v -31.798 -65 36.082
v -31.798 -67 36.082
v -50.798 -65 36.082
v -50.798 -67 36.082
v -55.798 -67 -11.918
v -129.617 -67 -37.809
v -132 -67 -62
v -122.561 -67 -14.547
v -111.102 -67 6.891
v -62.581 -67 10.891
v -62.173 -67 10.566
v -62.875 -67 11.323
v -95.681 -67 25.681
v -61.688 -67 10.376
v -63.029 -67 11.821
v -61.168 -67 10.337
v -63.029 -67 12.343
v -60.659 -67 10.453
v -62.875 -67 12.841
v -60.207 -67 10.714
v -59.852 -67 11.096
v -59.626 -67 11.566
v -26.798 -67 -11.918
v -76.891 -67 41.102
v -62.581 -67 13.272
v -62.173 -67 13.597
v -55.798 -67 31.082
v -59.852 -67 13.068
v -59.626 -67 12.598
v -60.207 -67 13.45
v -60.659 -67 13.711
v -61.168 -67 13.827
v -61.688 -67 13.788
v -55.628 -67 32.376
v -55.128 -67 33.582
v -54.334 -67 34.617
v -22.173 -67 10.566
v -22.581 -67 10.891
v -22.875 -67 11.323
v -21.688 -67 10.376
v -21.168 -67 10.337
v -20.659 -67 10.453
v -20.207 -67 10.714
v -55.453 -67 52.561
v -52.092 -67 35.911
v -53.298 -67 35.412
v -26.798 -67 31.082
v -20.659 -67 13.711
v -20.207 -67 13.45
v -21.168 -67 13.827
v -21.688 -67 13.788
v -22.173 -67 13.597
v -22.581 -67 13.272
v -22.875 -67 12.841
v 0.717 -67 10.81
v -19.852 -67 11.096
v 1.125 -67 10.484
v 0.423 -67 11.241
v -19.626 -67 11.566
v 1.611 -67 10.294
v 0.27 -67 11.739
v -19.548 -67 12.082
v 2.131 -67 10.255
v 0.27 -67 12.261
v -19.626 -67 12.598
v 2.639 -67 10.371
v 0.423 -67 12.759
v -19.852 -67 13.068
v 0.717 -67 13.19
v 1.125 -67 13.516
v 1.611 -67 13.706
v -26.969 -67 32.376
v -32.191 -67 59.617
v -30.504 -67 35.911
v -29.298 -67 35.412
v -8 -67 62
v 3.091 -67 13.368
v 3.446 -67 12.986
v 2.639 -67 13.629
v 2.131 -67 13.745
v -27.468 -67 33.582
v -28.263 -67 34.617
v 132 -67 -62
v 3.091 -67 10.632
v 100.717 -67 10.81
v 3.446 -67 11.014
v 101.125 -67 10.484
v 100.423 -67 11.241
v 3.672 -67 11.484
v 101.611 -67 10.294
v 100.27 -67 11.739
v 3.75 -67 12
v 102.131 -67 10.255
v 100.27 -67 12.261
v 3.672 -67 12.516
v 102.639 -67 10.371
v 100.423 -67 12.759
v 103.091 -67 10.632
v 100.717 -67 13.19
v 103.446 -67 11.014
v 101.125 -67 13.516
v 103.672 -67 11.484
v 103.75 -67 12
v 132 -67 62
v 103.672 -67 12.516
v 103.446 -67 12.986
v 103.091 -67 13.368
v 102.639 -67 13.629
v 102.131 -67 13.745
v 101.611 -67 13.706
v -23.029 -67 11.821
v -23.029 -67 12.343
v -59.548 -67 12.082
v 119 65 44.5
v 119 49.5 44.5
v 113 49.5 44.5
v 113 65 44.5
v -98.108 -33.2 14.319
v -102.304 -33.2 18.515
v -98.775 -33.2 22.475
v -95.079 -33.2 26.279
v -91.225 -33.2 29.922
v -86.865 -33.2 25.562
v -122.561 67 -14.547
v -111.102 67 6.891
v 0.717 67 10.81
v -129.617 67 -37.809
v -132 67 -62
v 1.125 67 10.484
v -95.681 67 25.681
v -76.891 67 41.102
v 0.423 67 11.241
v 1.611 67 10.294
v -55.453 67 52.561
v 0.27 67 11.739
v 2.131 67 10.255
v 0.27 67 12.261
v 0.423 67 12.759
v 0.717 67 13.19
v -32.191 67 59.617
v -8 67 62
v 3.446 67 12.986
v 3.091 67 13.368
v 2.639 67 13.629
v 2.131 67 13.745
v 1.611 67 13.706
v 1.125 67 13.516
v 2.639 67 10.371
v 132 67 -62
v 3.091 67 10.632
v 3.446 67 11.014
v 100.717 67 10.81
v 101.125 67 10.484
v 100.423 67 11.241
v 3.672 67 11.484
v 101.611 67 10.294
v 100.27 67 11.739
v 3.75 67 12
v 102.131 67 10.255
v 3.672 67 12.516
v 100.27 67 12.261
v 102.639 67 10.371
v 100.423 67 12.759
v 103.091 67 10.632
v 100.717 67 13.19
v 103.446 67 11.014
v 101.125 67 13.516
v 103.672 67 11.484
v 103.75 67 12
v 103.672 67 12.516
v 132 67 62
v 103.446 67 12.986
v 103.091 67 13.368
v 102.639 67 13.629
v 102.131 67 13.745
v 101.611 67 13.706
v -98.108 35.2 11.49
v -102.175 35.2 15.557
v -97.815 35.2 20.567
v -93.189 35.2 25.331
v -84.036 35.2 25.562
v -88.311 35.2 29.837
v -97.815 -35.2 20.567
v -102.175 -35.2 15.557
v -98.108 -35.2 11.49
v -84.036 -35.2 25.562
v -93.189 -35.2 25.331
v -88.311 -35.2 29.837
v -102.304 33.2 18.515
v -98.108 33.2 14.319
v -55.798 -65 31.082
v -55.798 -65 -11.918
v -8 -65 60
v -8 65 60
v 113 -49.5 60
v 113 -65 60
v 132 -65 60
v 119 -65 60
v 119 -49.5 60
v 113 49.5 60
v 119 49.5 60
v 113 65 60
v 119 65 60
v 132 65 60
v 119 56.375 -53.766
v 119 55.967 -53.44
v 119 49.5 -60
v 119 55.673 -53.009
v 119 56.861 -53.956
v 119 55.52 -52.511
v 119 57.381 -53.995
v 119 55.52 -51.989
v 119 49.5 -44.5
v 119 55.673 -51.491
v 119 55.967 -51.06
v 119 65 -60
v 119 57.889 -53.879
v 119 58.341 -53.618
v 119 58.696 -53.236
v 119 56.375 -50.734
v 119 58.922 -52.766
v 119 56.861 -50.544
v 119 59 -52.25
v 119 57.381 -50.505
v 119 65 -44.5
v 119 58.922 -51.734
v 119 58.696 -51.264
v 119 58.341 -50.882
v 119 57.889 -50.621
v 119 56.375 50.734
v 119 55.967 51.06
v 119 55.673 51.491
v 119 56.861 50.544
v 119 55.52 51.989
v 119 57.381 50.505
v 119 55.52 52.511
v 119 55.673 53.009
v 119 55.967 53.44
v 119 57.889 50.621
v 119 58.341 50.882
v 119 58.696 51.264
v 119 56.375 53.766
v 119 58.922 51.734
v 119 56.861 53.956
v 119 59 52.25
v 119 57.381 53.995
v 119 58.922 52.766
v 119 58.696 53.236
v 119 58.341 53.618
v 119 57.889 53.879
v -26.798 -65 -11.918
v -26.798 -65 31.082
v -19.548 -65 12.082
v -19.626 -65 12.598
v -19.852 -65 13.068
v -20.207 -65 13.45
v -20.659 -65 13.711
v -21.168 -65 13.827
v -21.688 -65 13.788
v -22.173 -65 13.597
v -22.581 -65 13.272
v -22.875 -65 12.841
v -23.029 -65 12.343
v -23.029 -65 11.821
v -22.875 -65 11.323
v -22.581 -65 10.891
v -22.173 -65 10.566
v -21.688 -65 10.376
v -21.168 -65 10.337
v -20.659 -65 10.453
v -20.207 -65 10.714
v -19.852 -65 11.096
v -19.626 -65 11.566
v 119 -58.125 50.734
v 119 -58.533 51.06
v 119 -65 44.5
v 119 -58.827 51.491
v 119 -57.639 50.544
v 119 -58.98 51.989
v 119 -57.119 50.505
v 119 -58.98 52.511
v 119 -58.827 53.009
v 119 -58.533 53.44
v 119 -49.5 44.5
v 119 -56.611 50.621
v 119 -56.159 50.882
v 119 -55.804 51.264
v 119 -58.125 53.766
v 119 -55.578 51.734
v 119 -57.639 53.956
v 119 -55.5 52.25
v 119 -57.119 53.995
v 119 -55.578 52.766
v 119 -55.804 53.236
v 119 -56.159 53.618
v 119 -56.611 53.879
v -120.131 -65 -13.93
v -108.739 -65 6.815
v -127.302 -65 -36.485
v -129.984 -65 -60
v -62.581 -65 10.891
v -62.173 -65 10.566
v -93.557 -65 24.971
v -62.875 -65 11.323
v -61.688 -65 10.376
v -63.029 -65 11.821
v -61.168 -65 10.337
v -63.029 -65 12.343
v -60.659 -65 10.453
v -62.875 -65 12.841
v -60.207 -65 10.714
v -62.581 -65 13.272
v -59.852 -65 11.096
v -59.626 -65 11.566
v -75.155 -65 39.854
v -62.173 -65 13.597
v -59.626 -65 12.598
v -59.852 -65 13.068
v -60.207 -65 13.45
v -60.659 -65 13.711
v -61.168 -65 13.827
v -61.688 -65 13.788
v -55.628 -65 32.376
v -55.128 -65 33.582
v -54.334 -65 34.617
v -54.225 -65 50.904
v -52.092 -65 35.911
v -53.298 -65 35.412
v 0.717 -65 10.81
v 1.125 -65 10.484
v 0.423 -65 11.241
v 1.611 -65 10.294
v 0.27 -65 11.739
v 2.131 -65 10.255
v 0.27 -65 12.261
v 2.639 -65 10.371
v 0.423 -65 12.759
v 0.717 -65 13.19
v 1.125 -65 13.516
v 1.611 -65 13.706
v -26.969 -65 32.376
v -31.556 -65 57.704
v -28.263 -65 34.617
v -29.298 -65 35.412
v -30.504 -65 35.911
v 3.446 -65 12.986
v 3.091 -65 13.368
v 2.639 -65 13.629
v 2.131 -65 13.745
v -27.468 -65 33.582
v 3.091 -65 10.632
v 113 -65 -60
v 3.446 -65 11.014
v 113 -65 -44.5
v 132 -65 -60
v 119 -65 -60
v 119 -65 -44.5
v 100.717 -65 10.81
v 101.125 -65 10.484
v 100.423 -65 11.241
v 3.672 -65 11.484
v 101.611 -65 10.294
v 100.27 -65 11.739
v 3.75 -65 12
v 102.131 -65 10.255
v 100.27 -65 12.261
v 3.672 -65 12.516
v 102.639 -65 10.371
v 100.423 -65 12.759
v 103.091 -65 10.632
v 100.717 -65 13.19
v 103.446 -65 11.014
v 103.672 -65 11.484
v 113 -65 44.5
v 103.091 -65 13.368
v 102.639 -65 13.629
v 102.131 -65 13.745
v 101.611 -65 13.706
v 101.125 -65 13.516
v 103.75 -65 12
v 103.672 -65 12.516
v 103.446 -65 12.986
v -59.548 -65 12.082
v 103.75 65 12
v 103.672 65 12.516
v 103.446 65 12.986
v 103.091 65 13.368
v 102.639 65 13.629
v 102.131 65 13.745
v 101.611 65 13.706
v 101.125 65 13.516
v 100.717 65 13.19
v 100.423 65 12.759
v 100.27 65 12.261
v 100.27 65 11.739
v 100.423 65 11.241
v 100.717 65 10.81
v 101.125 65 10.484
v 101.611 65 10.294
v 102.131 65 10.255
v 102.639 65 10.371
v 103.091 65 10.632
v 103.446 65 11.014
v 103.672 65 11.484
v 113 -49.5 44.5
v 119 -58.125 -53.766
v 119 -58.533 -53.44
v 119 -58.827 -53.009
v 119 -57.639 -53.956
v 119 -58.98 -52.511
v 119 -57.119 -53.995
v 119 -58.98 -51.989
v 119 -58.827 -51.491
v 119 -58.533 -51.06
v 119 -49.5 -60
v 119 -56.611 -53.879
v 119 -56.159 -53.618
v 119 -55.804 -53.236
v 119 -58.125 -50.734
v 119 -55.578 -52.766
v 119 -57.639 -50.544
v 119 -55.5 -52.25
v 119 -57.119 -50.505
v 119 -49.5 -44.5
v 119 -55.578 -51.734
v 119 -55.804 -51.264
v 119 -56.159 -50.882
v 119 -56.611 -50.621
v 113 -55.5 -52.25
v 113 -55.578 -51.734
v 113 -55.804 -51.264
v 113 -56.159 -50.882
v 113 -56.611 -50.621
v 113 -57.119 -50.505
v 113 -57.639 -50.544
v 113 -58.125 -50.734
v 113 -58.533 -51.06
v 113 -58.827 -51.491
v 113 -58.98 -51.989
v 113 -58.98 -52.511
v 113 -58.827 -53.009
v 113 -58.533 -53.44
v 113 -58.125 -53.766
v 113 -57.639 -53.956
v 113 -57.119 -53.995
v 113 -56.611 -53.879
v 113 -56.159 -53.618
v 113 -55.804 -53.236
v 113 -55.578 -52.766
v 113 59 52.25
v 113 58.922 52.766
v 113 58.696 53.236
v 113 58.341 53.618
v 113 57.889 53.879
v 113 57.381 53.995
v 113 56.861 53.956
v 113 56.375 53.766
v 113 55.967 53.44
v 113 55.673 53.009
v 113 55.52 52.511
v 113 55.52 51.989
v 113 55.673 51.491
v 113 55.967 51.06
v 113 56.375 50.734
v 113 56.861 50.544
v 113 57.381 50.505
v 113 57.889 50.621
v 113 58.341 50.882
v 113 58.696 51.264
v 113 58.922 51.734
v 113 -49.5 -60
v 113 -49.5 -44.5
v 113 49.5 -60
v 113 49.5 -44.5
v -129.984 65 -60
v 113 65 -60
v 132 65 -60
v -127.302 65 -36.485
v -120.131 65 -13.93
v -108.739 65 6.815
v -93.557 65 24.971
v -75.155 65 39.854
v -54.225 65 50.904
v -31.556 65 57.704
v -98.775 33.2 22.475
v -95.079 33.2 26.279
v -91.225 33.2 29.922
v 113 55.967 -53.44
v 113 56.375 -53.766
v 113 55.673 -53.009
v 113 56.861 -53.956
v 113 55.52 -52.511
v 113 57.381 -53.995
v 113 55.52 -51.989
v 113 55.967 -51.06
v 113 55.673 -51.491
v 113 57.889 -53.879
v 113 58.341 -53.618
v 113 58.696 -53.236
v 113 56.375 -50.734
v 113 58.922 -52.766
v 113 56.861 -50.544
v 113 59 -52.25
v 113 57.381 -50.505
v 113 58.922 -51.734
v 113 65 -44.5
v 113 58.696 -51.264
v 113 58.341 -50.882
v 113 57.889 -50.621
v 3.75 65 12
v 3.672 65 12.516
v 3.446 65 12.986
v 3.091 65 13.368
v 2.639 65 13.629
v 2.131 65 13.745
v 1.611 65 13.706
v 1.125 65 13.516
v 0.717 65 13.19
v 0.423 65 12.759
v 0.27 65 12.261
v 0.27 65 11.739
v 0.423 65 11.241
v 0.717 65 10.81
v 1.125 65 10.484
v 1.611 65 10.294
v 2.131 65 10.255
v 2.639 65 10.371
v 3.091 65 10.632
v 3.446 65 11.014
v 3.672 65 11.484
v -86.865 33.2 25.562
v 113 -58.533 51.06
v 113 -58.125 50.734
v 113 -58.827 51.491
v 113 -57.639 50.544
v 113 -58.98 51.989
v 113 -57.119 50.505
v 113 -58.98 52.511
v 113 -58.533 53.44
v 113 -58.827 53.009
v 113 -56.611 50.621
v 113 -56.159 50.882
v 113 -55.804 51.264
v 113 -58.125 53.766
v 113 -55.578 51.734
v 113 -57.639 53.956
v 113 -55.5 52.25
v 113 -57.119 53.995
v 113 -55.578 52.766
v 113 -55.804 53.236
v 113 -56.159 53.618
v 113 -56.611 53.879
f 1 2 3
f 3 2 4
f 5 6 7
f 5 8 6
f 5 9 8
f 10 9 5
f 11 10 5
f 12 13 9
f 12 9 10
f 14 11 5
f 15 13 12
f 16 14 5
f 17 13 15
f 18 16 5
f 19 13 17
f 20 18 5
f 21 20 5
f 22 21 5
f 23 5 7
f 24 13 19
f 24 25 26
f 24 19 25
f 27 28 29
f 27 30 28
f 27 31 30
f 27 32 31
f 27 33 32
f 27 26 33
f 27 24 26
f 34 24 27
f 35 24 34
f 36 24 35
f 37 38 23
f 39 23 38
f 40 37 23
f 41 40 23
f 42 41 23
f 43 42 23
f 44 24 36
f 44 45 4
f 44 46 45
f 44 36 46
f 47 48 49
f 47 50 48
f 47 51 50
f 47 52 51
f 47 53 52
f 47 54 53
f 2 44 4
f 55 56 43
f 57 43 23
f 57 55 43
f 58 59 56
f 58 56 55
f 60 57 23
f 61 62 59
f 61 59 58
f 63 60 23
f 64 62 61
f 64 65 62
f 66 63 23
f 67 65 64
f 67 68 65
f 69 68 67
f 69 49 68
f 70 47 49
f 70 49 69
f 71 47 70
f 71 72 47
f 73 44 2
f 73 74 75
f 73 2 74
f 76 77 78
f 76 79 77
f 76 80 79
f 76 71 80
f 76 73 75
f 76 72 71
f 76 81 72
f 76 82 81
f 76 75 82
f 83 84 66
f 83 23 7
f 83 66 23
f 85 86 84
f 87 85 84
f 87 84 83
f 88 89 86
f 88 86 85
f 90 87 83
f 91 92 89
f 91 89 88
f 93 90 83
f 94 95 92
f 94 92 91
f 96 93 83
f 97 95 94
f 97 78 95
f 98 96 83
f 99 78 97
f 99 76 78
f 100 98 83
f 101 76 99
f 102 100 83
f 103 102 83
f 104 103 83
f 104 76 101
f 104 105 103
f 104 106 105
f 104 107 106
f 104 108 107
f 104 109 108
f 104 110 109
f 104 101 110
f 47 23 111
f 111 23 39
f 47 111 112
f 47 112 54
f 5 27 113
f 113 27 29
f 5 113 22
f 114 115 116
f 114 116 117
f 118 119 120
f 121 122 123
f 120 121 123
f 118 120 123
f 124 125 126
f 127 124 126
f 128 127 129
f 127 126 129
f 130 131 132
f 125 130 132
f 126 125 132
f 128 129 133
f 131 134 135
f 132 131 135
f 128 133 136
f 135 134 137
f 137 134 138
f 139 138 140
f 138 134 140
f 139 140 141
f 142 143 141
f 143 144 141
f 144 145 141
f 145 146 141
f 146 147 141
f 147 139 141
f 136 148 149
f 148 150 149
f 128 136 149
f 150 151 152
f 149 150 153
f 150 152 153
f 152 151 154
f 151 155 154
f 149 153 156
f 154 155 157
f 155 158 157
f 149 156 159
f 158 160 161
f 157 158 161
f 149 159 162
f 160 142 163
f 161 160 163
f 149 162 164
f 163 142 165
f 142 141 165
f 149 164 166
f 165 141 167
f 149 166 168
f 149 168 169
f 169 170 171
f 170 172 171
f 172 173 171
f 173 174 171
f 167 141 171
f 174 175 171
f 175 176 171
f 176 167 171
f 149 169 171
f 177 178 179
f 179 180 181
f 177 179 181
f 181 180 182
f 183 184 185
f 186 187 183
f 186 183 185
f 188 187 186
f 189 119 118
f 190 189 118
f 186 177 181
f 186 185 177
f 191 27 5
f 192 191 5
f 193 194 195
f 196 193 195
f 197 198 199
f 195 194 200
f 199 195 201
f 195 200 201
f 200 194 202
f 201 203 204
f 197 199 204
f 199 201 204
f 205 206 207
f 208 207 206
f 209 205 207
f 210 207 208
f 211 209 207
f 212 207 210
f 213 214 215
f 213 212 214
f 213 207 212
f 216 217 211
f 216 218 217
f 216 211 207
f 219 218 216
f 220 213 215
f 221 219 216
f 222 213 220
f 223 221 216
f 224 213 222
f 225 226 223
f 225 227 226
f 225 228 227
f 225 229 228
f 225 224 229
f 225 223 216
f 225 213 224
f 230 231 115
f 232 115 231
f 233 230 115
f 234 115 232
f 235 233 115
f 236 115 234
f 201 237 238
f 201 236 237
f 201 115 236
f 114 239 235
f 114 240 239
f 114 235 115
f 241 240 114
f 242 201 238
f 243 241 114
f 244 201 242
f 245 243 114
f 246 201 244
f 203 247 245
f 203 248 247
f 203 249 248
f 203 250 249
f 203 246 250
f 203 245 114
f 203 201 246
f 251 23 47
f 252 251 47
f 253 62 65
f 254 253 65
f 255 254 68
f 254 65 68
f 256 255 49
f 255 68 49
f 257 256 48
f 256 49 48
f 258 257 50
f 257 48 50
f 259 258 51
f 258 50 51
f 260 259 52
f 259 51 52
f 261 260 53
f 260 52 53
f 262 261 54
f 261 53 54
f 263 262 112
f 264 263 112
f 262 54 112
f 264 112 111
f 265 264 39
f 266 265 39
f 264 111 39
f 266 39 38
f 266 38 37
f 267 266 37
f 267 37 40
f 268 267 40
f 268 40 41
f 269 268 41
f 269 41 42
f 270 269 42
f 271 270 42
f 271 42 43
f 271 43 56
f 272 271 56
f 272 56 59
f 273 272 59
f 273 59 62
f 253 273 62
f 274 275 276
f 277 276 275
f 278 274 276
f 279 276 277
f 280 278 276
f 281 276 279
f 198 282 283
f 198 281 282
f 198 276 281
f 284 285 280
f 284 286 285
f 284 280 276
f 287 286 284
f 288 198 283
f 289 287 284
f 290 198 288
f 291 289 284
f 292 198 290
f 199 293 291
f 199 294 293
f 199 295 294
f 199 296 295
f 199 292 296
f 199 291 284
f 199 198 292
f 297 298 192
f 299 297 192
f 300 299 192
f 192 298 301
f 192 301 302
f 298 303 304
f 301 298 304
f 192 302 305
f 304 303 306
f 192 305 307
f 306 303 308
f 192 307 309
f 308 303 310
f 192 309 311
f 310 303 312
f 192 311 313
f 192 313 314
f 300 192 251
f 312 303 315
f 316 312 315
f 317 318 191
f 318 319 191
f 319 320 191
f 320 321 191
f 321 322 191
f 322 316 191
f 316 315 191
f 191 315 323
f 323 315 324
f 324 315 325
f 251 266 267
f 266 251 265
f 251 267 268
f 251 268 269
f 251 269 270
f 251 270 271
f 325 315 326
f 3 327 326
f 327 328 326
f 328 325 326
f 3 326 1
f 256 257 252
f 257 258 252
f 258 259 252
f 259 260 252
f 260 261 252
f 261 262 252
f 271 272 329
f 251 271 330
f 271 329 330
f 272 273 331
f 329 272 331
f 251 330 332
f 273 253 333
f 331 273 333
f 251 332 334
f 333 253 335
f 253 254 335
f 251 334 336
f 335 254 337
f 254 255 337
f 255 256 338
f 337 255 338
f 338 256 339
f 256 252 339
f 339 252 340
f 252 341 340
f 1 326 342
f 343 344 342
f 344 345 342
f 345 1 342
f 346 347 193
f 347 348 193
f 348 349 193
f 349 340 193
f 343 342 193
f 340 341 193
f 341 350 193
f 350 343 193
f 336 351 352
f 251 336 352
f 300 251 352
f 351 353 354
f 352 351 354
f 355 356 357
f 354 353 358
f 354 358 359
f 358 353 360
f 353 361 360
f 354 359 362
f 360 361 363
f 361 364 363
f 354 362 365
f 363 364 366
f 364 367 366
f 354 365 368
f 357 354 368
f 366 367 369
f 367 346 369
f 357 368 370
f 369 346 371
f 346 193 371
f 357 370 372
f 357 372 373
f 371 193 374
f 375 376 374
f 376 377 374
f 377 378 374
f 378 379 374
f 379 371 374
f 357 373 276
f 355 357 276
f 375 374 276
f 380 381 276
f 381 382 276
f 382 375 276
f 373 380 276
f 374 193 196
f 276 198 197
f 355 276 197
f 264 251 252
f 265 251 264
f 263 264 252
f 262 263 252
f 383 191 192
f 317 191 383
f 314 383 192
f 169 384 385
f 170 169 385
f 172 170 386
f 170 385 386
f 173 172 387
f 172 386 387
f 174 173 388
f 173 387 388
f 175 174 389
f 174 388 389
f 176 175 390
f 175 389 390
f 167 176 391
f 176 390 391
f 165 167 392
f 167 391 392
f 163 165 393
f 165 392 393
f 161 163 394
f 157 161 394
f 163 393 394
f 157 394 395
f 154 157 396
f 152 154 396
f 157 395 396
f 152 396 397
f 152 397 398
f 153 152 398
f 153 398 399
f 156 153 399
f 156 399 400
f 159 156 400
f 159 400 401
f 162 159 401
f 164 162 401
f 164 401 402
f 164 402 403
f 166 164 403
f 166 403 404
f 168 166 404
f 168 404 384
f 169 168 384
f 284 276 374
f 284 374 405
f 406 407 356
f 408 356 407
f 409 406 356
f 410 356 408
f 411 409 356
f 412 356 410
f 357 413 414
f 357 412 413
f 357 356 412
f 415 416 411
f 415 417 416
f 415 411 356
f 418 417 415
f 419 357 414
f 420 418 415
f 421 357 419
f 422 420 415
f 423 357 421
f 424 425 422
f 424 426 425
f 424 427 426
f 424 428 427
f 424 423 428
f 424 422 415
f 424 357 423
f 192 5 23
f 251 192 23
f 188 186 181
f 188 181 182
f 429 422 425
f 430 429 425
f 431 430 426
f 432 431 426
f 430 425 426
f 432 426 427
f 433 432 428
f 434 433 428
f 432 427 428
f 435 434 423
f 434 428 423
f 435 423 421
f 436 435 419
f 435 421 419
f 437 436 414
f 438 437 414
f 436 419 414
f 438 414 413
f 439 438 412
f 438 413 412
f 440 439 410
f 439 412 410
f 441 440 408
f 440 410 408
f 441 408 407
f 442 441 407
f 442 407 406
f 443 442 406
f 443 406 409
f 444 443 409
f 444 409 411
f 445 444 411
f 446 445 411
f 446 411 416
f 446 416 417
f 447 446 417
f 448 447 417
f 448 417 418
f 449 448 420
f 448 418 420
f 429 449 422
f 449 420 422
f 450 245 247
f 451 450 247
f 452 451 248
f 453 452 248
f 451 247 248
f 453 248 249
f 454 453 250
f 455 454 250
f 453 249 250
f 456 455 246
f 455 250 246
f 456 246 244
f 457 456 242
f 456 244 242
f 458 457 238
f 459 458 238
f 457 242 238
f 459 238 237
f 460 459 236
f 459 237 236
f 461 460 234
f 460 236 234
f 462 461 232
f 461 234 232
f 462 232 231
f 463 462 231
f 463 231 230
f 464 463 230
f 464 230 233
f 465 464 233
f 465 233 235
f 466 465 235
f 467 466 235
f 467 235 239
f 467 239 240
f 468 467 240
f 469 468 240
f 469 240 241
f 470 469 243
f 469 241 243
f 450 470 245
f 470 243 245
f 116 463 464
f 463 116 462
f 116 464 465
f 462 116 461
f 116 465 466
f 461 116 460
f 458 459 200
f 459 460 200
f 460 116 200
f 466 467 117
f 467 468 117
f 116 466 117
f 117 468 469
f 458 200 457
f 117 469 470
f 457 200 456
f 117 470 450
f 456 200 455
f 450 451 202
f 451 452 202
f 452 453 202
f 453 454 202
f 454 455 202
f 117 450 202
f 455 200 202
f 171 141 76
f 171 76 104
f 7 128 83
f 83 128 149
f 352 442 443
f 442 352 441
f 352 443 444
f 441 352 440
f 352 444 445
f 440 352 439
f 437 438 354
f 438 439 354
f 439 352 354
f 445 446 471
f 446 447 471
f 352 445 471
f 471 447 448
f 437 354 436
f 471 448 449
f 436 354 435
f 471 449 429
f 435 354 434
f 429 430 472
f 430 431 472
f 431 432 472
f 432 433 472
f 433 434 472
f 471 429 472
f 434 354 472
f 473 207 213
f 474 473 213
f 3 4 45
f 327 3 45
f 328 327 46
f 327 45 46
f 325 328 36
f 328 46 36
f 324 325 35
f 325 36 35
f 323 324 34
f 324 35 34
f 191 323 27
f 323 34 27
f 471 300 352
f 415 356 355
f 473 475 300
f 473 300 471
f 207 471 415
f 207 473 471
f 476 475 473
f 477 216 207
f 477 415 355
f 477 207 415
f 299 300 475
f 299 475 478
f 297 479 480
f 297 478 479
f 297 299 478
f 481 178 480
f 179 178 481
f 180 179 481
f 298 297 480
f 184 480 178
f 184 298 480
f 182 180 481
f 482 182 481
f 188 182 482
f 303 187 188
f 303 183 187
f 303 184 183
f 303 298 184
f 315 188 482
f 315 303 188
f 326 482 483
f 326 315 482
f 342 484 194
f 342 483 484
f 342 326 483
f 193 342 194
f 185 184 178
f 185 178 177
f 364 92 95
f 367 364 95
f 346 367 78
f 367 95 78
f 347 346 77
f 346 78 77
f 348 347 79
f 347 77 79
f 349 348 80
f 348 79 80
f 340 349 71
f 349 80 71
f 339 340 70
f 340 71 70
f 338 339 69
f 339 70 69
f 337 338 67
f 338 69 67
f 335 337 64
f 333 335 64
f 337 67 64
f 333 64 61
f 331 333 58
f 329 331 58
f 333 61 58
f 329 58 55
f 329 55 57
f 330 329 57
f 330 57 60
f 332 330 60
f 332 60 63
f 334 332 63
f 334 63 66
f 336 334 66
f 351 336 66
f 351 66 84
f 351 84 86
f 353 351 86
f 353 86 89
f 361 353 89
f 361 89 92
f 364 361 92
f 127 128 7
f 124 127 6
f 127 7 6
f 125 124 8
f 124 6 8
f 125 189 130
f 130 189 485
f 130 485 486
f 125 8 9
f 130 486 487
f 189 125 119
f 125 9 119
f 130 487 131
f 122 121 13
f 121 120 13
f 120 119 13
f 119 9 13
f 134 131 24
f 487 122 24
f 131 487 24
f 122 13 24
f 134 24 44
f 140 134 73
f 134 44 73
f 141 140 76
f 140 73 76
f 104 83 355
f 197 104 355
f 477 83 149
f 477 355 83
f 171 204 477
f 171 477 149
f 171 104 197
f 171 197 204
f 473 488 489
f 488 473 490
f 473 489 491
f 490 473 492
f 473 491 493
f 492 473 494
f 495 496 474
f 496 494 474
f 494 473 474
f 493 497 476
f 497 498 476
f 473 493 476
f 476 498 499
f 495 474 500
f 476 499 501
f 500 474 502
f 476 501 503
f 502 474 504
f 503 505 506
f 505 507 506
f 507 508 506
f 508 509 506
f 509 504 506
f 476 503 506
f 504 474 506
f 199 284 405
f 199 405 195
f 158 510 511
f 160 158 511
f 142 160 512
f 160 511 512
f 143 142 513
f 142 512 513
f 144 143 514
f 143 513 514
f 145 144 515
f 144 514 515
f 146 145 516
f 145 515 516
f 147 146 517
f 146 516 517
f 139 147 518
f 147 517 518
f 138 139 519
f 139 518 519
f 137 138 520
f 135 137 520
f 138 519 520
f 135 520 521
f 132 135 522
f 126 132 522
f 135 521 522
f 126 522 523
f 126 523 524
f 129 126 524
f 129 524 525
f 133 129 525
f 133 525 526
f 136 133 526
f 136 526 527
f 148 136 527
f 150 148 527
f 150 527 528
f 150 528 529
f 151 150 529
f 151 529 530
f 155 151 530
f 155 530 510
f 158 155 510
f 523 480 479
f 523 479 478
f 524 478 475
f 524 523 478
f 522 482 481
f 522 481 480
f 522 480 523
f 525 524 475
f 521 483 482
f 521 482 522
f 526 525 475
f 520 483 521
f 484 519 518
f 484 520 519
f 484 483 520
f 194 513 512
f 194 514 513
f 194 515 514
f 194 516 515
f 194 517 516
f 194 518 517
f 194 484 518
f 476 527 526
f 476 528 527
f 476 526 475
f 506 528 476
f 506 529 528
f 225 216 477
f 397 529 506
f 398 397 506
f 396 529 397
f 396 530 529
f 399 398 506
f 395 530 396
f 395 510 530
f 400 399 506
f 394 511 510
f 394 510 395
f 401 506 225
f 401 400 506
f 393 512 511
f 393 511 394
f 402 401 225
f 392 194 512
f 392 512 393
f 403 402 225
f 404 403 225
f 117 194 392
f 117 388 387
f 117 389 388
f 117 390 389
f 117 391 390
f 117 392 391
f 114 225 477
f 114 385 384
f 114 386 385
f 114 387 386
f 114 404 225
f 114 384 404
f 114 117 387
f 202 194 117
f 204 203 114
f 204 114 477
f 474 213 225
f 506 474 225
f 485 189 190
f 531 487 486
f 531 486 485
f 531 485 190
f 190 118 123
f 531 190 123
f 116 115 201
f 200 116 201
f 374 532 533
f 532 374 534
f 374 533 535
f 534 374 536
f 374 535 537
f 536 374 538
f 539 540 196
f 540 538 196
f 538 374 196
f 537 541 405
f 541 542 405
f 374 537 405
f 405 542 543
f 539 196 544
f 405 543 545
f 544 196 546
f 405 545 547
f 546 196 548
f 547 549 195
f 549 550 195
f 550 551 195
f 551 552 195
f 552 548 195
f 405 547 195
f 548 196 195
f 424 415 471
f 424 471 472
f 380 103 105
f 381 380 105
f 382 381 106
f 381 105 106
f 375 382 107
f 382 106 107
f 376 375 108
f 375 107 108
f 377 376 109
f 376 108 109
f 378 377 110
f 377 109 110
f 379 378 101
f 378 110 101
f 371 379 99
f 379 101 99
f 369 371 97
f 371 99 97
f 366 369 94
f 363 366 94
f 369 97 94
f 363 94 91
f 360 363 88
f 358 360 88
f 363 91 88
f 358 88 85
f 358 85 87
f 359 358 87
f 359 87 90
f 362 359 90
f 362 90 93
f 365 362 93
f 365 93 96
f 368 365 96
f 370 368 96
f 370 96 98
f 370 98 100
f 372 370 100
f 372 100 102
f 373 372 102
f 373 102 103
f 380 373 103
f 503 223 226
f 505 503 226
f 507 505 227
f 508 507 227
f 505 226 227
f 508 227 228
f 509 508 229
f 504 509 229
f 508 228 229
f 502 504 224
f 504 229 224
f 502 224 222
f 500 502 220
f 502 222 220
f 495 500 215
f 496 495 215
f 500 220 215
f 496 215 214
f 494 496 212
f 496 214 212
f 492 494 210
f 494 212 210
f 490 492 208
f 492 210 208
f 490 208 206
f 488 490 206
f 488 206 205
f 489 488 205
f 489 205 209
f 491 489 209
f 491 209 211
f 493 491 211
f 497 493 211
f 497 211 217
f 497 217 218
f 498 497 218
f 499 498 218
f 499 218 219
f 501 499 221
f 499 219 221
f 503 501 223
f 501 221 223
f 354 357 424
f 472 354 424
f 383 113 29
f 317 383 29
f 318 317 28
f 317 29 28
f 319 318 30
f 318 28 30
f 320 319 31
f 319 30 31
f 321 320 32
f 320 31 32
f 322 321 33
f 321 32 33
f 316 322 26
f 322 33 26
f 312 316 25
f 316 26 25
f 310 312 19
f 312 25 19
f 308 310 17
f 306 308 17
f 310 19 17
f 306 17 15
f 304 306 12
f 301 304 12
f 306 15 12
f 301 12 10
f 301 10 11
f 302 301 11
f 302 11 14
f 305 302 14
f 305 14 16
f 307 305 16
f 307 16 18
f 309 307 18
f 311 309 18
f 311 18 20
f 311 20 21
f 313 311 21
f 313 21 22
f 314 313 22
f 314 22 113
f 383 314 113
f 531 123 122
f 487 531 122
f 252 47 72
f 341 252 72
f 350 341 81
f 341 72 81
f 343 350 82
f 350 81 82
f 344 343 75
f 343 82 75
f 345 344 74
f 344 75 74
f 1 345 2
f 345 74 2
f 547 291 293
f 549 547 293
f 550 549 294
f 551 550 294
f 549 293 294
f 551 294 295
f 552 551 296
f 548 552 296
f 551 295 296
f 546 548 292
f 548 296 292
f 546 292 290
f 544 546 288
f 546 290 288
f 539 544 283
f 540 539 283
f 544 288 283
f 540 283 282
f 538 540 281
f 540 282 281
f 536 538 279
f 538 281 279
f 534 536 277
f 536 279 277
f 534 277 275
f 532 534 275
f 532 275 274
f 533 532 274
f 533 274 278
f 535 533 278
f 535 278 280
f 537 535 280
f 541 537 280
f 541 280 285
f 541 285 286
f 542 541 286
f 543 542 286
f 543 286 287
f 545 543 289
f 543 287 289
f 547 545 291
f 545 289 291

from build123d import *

# Parameters (mm, degrees)
F0_W      = 264
F0_H      = 134
F1_DEPTH  = 62
F3_DEPTH  = 150
F7_START  = -33.8
F7_DEPTH  = 66.4
F8_T      = -2
F9_R      = 1.75
F10_DEPTH = 134.001
F11_R     = 1.75
F12_DEPTH = 25
F14_START = -13
F13_W     = 15.5
F13_H     = 15.5
F13_R     = 1.75
F14_DEPTH = 6


# Not quite as in the source:
# - a feature of the source that left no trace in its solid (it failed there, or was rolled back) is left out


with BuildPart() as f1:
    # F0 (on Top) → F1 (new body, symmetric)
    with BuildSketch(Plane.XY):
        Rectangle(F0_W, F0_H)
    extrude(amount=F1_DEPTH, both=True)

    # F2 (on face) → F3 (cut)
    with BuildSketch(Plane.XZ.offset(67)):
        with BuildLine():
            ThreePointArc((-132, -62), (-95.6812408671, 25.6812408671), (-8, 62))
            Line((-8, 62), (-132, 62))
            Line((-132, 62), (-132, -62))
        make_face()
    extrude(amount=-F3_DEPTH, mode=Mode.SUBTRACT)

    # F6 (on face) → F7 (cut)
    with BuildSketch(Plane.XZ.offset(67).offset(F7_START)):
        Polygon((-105.1785842524, 21.3899467149), (-98.1075164406, 14.318878903), (-86.8645186197, 25.5618767239), (-93.9355864316, 32.6329445358), align=None)
    extrude(amount=-F7_DEPTH, mode=Mode.SUBTRACT)

    # F8
    f8_openings = [f1.faces().sort_by_distance(p)[0] for p in [
        (132, 0, 0),
    ]]
    offset(amount=F8_T, openings=f8_openings, kind=Kind.INTERSECTION)

    # F9 (on face) → F10 (cut, through all)
    with BuildSketch(Plane.XZ.offset(67)):
        with Locations((102, 12)):
            Circle(F9_R)
        with Locations((2, 12)):
            Circle(F9_R)
    extrude(amount=-F10_DEPTH, mode=Mode.SUBTRACT)

    # F11 (on face) → F12 (cut)
    with BuildSketch(Plane.XZ.offset(67)):
        with BuildLine():
            ThreePointArc((-26.79829216, 31.0818016827), (-28.2627582541, 34.6173355886), (-31.79829216, 36.0818016827))
            Line((-31.79829216, 36.0818016827), (-50.79829216, 36.0818016827))
            ThreePointArc((-50.79829216, 36.0818016827), (-54.333826066, 34.6173355886), (-55.79829216, 31.0818016827))
            Line((-55.79829216, 31.0818016827), (-55.79829216, -11.9181983173))
            Line((-55.79829216, -11.9181983173), (-26.79829216, -11.9181983173))
            Line((-26.79829216, -11.9181983173), (-26.79829216, 31.0818016827))
        make_face()
        with Locations((-61.29829216, 12.0818016827)):
            Circle(F11_R)
        with Locations((-21.29829216, 12.0818016827)):
            Circle(F11_R)
    extrude(amount=-F12_DEPTH, mode=Mode.SUBTRACT)

    # F13 (on face) → F14 (join)
    with BuildSketch(Plane.YZ.offset(132).offset(F14_START)):
        with Locations((-57.25, 52.25)):
            Rectangle(F13_W, F13_H)
        with Locations((-57.25, 52.25)):
            Circle(F13_R, mode=Mode.SUBTRACT)
        with Locations((57.25, 52.25)):
            Rectangle(F13_W, F13_H)
        with Locations((57.25, 52.25)):
            Circle(F13_R, mode=Mode.SUBTRACT)
        with Locations((57.25, -52.25)):
            Rectangle(F13_W, F13_H)
        with Locations((57.25, -52.25)):
            Circle(F13_R, mode=Mode.SUBTRACT)
        with Locations((-57.25, -52.25)):
            Rectangle(F13_W, F13_H)
        with Locations((-57.25, -52.25)):
            Circle(F13_R, mode=Mode.SUBTRACT)
    extrude(amount=-F14_DEPTH)


solid = f1.part
